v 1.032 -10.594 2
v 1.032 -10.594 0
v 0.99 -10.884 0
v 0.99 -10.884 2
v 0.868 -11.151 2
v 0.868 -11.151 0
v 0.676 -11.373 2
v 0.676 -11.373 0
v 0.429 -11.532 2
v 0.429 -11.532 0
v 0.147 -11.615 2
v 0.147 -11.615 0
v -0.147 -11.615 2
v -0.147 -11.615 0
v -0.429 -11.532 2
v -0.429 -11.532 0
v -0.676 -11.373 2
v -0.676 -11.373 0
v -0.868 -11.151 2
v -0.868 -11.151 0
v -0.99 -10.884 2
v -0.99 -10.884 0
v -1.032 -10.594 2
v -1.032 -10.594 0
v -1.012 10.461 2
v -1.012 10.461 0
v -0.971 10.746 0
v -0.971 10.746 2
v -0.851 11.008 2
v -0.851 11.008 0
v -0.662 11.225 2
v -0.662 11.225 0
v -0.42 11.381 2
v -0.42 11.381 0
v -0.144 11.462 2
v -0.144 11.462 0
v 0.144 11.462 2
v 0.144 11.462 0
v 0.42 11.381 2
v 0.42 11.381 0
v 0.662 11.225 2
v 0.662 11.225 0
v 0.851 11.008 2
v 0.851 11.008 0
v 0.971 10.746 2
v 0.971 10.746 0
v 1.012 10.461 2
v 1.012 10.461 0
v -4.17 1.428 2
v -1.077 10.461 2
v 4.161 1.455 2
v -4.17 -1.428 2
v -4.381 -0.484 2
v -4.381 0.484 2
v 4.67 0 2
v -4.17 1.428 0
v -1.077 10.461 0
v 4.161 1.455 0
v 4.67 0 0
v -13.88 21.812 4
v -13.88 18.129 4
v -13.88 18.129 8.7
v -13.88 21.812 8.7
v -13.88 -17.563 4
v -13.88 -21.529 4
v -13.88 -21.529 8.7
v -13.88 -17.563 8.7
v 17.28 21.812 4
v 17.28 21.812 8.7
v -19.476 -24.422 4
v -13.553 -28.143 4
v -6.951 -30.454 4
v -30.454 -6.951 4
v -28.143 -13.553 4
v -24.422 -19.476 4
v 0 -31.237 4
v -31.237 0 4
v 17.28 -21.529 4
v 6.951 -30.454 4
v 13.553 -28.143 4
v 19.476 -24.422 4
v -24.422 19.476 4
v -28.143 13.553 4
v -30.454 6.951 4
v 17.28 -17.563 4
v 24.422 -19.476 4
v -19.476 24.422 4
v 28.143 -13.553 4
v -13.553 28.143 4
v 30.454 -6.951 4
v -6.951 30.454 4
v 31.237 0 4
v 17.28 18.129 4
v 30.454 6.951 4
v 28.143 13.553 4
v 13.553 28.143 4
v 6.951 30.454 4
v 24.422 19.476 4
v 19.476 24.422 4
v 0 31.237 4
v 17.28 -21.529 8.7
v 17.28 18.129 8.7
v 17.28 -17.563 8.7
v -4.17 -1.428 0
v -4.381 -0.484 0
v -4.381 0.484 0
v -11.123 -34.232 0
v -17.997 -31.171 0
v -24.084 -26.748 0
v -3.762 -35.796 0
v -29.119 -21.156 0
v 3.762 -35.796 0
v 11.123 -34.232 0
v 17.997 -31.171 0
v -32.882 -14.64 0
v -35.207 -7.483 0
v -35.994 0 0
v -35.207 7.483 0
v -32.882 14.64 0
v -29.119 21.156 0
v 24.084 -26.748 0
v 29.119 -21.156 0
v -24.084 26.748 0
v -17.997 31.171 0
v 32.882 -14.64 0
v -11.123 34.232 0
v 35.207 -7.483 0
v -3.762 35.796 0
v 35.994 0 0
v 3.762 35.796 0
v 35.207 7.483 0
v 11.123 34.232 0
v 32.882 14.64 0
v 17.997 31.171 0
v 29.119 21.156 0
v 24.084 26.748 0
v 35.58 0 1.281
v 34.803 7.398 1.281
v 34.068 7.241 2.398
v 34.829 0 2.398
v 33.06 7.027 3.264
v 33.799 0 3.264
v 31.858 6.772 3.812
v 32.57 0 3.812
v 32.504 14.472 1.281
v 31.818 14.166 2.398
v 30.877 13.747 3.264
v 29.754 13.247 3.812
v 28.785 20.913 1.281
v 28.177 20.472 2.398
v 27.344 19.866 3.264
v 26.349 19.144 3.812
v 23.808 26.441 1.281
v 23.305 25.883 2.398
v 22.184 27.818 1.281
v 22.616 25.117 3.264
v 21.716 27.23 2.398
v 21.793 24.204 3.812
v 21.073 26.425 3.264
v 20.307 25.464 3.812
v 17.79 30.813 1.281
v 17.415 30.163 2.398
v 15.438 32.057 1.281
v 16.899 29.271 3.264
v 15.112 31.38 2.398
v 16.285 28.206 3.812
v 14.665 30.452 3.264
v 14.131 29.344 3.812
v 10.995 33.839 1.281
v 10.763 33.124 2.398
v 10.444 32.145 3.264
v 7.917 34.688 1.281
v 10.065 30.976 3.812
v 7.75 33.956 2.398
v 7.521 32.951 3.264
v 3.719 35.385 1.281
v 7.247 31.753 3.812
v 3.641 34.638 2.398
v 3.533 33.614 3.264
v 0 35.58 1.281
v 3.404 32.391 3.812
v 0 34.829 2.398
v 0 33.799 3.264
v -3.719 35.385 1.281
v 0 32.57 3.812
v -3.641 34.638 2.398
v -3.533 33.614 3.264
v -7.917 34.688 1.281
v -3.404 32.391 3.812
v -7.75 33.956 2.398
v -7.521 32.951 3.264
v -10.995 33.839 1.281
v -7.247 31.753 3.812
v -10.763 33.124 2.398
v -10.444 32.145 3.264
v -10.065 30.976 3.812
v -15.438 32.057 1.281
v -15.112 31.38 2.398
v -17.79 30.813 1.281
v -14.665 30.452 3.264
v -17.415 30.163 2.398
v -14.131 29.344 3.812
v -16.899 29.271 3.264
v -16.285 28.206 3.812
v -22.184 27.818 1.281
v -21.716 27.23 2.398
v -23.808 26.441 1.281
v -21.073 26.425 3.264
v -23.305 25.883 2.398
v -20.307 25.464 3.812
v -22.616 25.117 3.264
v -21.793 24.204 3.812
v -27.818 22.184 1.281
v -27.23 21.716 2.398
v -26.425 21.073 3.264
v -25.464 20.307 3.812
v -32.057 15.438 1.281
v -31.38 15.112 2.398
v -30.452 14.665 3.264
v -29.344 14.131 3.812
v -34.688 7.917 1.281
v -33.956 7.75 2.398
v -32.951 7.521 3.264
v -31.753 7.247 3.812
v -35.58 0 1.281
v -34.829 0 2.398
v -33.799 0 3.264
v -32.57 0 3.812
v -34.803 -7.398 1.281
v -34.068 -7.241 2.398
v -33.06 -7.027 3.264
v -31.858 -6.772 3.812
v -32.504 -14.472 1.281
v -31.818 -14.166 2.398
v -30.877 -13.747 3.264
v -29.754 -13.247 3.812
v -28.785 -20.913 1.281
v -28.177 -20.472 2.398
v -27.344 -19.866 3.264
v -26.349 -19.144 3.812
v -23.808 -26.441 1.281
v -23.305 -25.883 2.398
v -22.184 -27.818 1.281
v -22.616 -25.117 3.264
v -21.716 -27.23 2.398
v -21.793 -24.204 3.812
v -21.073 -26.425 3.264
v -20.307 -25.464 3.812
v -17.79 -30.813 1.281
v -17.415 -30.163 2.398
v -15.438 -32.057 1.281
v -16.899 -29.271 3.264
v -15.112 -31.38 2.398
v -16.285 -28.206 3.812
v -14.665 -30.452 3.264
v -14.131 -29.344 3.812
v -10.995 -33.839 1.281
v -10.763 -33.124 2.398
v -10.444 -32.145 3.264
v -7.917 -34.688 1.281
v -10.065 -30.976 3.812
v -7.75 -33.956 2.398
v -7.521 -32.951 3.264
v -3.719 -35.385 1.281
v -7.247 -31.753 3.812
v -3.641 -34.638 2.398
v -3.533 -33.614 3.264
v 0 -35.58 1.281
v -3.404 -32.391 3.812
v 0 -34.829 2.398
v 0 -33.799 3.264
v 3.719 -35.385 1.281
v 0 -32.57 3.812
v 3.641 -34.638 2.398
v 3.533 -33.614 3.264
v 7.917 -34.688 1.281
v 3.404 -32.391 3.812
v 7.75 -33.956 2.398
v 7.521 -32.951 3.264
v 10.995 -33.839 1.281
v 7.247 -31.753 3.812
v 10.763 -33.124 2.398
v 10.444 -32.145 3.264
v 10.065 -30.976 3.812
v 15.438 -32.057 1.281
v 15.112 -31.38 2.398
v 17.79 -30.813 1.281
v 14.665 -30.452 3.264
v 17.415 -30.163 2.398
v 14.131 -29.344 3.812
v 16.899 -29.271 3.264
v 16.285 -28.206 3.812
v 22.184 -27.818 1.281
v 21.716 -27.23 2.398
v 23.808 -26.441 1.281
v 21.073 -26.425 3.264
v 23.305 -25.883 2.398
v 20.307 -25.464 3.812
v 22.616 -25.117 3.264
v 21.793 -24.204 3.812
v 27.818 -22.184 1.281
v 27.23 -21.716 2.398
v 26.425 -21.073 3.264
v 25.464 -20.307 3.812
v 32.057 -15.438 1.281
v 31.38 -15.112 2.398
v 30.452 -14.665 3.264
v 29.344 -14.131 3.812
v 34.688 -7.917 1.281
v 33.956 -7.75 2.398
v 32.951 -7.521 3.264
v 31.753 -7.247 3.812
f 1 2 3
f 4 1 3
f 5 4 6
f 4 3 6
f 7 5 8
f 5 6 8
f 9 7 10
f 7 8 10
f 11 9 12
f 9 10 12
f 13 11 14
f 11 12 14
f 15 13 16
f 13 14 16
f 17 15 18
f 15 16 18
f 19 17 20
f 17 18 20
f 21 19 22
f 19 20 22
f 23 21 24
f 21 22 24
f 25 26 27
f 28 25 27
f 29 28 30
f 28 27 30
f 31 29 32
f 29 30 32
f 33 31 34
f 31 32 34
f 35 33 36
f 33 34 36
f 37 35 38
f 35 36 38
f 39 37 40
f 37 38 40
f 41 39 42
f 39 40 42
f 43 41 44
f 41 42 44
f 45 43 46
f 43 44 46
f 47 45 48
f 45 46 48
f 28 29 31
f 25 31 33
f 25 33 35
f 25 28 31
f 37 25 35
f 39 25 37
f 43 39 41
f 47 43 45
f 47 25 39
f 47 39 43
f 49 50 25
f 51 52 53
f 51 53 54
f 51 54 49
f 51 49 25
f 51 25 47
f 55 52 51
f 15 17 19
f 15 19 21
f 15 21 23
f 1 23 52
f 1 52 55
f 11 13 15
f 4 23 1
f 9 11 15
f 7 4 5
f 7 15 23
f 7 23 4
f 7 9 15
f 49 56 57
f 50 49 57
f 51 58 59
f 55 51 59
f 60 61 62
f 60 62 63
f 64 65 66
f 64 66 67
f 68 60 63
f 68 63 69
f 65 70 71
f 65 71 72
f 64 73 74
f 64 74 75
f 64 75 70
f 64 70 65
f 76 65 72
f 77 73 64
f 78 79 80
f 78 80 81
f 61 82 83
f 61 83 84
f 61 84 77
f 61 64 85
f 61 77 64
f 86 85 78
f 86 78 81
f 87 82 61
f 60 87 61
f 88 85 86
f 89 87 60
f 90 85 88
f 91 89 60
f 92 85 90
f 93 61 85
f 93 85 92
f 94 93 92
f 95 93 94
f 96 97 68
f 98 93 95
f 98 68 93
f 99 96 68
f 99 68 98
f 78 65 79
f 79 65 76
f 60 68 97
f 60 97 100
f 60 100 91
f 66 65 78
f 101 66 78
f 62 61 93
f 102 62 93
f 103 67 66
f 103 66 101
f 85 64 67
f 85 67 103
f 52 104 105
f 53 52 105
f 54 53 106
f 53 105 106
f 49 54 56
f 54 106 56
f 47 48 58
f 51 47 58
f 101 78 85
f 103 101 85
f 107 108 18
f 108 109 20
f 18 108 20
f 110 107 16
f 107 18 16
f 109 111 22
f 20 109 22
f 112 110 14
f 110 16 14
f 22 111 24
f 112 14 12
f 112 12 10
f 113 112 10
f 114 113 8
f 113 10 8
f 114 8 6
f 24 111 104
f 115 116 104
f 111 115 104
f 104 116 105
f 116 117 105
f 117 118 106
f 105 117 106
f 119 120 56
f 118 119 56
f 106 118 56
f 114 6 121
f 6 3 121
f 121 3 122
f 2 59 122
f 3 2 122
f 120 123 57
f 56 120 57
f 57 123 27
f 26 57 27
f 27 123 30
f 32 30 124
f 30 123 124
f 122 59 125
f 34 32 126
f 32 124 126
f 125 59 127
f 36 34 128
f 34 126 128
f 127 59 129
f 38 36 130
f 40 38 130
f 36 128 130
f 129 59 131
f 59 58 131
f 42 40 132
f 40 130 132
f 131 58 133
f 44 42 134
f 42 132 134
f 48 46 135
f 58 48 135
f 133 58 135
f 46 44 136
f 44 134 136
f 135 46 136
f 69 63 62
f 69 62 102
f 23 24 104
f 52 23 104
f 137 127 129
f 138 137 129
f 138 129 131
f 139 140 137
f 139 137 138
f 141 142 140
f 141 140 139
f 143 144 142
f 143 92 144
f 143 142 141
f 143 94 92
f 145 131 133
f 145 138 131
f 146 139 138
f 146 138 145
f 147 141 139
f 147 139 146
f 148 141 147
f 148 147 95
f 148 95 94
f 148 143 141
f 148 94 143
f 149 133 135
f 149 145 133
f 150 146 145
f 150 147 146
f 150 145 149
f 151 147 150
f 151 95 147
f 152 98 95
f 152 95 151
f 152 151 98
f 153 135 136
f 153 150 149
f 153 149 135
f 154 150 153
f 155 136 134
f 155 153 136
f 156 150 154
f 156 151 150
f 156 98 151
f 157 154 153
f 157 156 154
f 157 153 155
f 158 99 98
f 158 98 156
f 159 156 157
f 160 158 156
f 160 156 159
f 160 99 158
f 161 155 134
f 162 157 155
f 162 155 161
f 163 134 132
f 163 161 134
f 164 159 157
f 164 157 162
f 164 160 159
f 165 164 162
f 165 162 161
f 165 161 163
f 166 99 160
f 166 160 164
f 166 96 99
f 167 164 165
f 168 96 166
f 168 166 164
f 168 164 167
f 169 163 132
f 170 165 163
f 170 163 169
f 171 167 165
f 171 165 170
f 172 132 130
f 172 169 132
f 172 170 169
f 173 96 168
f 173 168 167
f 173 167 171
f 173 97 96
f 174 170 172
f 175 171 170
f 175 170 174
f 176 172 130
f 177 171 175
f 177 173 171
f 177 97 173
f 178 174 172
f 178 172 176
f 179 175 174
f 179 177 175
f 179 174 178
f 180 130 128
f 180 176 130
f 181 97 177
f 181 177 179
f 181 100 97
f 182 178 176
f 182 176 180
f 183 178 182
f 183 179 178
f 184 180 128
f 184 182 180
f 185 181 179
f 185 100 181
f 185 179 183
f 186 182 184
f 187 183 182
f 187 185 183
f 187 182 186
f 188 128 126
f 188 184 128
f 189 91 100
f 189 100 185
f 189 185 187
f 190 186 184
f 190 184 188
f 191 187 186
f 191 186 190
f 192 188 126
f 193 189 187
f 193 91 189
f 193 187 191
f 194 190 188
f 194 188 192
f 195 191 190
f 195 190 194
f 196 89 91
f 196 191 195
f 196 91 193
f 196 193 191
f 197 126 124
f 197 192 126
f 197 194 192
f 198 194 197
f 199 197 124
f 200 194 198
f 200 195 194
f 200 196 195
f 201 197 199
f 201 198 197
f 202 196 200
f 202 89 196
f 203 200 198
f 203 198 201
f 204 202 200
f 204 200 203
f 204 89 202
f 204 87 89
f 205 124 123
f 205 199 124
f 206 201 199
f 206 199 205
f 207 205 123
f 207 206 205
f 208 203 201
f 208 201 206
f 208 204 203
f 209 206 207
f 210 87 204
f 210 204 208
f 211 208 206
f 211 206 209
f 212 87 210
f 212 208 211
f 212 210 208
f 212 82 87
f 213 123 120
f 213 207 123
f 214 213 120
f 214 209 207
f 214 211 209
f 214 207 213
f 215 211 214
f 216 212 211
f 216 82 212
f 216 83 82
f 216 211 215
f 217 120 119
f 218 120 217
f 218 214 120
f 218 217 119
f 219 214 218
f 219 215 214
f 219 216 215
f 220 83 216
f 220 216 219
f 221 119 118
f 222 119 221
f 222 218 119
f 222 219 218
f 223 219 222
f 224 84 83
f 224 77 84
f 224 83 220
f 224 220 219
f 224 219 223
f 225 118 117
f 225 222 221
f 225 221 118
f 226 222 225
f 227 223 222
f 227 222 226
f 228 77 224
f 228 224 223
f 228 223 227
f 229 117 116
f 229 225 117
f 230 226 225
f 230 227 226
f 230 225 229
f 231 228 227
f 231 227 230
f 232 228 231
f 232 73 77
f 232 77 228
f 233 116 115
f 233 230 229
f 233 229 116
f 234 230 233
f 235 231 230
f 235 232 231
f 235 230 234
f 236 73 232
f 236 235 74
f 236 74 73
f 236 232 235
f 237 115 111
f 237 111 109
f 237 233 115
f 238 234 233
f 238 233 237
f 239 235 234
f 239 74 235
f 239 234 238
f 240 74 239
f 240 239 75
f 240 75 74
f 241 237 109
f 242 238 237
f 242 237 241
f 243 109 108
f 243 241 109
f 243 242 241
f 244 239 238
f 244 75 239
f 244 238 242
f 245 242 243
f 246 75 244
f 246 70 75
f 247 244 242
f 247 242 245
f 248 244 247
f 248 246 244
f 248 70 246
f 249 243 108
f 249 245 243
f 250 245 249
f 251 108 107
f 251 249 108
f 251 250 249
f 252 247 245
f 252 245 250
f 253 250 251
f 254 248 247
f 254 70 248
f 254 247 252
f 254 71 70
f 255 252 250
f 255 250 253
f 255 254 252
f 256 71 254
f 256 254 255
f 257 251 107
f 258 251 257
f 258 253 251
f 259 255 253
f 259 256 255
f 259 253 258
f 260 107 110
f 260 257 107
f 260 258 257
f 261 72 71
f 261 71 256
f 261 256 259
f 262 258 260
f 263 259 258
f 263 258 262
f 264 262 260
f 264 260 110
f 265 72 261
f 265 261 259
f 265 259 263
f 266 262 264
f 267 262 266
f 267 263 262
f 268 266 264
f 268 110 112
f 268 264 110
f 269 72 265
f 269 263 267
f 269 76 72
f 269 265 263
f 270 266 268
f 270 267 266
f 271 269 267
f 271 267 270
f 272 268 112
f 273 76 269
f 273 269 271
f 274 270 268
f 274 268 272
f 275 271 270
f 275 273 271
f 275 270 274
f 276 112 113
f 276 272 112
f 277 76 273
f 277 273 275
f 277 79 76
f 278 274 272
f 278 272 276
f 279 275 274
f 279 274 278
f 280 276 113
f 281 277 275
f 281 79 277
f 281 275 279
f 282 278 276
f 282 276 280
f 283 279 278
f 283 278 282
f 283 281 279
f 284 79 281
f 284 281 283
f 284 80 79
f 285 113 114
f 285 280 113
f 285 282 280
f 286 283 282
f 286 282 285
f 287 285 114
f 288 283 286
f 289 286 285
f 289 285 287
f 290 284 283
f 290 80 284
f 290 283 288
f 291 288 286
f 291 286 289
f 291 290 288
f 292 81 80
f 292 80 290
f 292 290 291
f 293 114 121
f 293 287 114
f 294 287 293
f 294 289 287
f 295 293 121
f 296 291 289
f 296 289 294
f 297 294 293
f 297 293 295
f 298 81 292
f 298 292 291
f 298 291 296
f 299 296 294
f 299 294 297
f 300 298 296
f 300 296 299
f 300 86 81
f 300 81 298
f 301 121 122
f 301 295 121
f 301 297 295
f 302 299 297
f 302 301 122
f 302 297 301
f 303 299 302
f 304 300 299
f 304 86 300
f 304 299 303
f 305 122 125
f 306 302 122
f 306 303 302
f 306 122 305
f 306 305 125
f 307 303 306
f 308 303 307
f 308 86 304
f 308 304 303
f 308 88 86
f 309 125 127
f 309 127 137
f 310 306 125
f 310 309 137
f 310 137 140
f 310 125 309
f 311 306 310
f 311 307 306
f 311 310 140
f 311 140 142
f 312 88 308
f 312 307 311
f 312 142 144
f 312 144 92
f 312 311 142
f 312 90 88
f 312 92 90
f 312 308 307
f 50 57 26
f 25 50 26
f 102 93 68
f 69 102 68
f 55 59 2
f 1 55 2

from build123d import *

# Parameters (mm, degrees)
F0_R     = 35.9935602645
F1_DEPTH = 4
F3_W     = 31.1600742862
F3_H     = 3.6825519055
F3_H_2   = 3.9658267051
F4_DEPTH = 4.7
F6_DEPTH = 2


# Not quite as in the source:
# - a fillet or chamfer that OpenCascade refuses, or shapes differently, is made with other operations: its cross-section is extruded or revolved along the edge and cut away or added


with BuildPart() as f1:
    # F0 (on Top) → F1 (new body)
    with BuildSketch(Plane.XY):
        Circle(F0_R)
    extrude(amount=F1_DEPTH)

    # F2: fillet of radius 4.8284271247 on 1 edges, made by hand

    # F2_s1 → F2_t2 (revolve, cut)
    with BuildSketch(Plane.XZ):
        with BuildLine():
            ThreePointArc((35.9935602645, 0), (34.3442797526, 2.8670910053), (31.2367318045, 4))
            Line((31.2367318045, 4), (35.9935602645, 4))
            Line((35.9935602645, 4), (35.9935602645, 0))
        make_face()
    revolve(axis=Axis((0, 0, 4), (0, 0, 1)), mode=Mode.SUBTRACT)

    # F3 (on face) → F4 (join)
    with BuildSketch(Plane.XY.offset(4)):
        with Locations((1.6996399499, 19.9707737193)):
            Rectangle(F3_W, F3_H)
        with Locations((1.6996399499, -19.5458633825)):
            Rectangle(F3_W, F3_H_2)
    extrude(amount=F4_DEPTH)

    # F5 (on face) → F6 (cut)
    with BuildSketch(Plane(origin=(0, 0, 0), x_dir=(1, 0, 0), z_dir=(0, 0, -1))):
        with BuildLine():
            Line((1.0116308873, -10.4608191177), (4.1609390889, -1.4550810977))
            ThreePointArc((4.1609390889, -1.4550810977), (-0.0142907136, -4.4080007801), (-4.1702862527, -1.4280713123))
            Line((-4.1702862527, -1.4280713123), (-1.0771154127, -10.4608191177))
            Line((-1.0771154127, -10.4608191177), (-1.0116308873, -10.4608191177))
            ThreePointArc((-1.0116308873, -10.4608191177), (0, -9.4491882305), (1.0116308873, -10.4608191177))
        make_face()
        with BuildLine():
            ThreePointArc((-1.0116308873, -10.4608191177), (0, -11.472450005), (1.0116308873, -10.4608191177))
            Line((1.0116308873, -10.4608191177), (0, -10.4608191177))
            Line((0, -10.4608191177), (-1.0116308873, -10.4608191177))
        make_face()
        with BuildLine():
            Line((0, -10.4608191177), (1.0116308873, -10.4608191177))
            ThreePointArc((1.0116308873, -10.4608191177), (0, -9.4491882305), (-1.0116308873, -10.4608191177))
            Line((-1.0116308873, -10.4608191177), (0, -10.4608191177))
        make_face()
        with BuildLine():
            ThreePointArc((4.1609390889, -1.4550810977), (4.3458137466, -0.7379552708), (4.4080239453, 0))
            ThreePointArc((4.4080239453, 0), (0.7238623632, 4.3481833426), (-4.1702862527, 1.4280713123))
            ThreePointArc((-4.1702862527, 1.4280713123), (-4.4080239453, 0), (-4.1702862527, -1.4280713123))
            ThreePointArc((-4.1702862527, -1.4280713123), (-0.0142907136, -4.4080007801), (4.1609390889, -1.4550810977))
        make_face()
        with BuildLine():
            ThreePointArc((-4.1702862527, 1.4280713123), (0.7238623632, 4.3481833426), (4.4080239453, 0))
            ThreePointArc((4.4080239453, 0), (4.3458137466, -0.7379552708), (4.1609390889, -1.4550810977))
            Line((4.1609390889, -1.4550810977), (4.6697812098, 0))
            Line((4.6697812098, 0), (1.0316451427, 10.5936024338))
            ThreePointArc((1.0316451427, 10.5936024338), (0, 9.5619572911), (-1.0316451427, 10.5936024338))
            Line((-1.0316451427, 10.5936024338), (-4.1702862527, 1.4280713123))
        make_face()
        with BuildLine():
            ThreePointArc((1.0316451427, 10.5936024338), (0, 11.6252475765), (-1.0316451427, 10.5936024338))
            Line((-1.0316451427, 10.5936024338), (0, 10.5936024338))
            Line((0, 10.5936024338), (1.0316451427, 10.5936024338))
        make_face()
        with BuildLine():
            Line((0, 10.5936024338), (-1.0316451427, 10.5936024338))
            ThreePointArc((-1.0316451427, 10.5936024338), (0, 9.5619572911), (1.0316451427, 10.5936024338))
            Line((1.0316451427, 10.5936024338), (0, 10.5936024338))
        make_face()
    extrude(amount=-F6_DEPTH, mode=Mode.SUBTRACT)


solid = f1.part
